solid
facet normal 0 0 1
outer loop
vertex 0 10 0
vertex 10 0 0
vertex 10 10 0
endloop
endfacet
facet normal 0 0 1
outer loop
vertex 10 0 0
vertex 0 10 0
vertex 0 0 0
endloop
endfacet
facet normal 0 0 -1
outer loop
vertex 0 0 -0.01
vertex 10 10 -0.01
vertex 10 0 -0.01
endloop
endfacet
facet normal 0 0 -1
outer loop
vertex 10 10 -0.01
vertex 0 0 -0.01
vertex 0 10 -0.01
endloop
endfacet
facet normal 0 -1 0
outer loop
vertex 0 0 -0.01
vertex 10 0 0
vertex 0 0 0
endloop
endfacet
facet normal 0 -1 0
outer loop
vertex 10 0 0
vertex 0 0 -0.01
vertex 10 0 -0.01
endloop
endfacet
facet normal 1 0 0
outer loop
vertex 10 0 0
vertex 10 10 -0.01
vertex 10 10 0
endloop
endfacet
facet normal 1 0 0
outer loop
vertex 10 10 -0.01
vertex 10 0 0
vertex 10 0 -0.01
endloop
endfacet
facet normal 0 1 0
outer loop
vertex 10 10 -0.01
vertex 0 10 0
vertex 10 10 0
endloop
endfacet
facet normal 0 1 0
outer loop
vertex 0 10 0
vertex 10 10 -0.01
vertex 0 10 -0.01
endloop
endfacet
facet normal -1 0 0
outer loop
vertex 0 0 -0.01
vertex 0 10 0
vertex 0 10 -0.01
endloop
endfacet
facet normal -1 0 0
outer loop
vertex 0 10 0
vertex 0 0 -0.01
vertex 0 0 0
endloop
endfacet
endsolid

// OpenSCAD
translate([0,0,-0.01]) color([0.1,0.1,0.1]) cube([10,10,0.01]);
